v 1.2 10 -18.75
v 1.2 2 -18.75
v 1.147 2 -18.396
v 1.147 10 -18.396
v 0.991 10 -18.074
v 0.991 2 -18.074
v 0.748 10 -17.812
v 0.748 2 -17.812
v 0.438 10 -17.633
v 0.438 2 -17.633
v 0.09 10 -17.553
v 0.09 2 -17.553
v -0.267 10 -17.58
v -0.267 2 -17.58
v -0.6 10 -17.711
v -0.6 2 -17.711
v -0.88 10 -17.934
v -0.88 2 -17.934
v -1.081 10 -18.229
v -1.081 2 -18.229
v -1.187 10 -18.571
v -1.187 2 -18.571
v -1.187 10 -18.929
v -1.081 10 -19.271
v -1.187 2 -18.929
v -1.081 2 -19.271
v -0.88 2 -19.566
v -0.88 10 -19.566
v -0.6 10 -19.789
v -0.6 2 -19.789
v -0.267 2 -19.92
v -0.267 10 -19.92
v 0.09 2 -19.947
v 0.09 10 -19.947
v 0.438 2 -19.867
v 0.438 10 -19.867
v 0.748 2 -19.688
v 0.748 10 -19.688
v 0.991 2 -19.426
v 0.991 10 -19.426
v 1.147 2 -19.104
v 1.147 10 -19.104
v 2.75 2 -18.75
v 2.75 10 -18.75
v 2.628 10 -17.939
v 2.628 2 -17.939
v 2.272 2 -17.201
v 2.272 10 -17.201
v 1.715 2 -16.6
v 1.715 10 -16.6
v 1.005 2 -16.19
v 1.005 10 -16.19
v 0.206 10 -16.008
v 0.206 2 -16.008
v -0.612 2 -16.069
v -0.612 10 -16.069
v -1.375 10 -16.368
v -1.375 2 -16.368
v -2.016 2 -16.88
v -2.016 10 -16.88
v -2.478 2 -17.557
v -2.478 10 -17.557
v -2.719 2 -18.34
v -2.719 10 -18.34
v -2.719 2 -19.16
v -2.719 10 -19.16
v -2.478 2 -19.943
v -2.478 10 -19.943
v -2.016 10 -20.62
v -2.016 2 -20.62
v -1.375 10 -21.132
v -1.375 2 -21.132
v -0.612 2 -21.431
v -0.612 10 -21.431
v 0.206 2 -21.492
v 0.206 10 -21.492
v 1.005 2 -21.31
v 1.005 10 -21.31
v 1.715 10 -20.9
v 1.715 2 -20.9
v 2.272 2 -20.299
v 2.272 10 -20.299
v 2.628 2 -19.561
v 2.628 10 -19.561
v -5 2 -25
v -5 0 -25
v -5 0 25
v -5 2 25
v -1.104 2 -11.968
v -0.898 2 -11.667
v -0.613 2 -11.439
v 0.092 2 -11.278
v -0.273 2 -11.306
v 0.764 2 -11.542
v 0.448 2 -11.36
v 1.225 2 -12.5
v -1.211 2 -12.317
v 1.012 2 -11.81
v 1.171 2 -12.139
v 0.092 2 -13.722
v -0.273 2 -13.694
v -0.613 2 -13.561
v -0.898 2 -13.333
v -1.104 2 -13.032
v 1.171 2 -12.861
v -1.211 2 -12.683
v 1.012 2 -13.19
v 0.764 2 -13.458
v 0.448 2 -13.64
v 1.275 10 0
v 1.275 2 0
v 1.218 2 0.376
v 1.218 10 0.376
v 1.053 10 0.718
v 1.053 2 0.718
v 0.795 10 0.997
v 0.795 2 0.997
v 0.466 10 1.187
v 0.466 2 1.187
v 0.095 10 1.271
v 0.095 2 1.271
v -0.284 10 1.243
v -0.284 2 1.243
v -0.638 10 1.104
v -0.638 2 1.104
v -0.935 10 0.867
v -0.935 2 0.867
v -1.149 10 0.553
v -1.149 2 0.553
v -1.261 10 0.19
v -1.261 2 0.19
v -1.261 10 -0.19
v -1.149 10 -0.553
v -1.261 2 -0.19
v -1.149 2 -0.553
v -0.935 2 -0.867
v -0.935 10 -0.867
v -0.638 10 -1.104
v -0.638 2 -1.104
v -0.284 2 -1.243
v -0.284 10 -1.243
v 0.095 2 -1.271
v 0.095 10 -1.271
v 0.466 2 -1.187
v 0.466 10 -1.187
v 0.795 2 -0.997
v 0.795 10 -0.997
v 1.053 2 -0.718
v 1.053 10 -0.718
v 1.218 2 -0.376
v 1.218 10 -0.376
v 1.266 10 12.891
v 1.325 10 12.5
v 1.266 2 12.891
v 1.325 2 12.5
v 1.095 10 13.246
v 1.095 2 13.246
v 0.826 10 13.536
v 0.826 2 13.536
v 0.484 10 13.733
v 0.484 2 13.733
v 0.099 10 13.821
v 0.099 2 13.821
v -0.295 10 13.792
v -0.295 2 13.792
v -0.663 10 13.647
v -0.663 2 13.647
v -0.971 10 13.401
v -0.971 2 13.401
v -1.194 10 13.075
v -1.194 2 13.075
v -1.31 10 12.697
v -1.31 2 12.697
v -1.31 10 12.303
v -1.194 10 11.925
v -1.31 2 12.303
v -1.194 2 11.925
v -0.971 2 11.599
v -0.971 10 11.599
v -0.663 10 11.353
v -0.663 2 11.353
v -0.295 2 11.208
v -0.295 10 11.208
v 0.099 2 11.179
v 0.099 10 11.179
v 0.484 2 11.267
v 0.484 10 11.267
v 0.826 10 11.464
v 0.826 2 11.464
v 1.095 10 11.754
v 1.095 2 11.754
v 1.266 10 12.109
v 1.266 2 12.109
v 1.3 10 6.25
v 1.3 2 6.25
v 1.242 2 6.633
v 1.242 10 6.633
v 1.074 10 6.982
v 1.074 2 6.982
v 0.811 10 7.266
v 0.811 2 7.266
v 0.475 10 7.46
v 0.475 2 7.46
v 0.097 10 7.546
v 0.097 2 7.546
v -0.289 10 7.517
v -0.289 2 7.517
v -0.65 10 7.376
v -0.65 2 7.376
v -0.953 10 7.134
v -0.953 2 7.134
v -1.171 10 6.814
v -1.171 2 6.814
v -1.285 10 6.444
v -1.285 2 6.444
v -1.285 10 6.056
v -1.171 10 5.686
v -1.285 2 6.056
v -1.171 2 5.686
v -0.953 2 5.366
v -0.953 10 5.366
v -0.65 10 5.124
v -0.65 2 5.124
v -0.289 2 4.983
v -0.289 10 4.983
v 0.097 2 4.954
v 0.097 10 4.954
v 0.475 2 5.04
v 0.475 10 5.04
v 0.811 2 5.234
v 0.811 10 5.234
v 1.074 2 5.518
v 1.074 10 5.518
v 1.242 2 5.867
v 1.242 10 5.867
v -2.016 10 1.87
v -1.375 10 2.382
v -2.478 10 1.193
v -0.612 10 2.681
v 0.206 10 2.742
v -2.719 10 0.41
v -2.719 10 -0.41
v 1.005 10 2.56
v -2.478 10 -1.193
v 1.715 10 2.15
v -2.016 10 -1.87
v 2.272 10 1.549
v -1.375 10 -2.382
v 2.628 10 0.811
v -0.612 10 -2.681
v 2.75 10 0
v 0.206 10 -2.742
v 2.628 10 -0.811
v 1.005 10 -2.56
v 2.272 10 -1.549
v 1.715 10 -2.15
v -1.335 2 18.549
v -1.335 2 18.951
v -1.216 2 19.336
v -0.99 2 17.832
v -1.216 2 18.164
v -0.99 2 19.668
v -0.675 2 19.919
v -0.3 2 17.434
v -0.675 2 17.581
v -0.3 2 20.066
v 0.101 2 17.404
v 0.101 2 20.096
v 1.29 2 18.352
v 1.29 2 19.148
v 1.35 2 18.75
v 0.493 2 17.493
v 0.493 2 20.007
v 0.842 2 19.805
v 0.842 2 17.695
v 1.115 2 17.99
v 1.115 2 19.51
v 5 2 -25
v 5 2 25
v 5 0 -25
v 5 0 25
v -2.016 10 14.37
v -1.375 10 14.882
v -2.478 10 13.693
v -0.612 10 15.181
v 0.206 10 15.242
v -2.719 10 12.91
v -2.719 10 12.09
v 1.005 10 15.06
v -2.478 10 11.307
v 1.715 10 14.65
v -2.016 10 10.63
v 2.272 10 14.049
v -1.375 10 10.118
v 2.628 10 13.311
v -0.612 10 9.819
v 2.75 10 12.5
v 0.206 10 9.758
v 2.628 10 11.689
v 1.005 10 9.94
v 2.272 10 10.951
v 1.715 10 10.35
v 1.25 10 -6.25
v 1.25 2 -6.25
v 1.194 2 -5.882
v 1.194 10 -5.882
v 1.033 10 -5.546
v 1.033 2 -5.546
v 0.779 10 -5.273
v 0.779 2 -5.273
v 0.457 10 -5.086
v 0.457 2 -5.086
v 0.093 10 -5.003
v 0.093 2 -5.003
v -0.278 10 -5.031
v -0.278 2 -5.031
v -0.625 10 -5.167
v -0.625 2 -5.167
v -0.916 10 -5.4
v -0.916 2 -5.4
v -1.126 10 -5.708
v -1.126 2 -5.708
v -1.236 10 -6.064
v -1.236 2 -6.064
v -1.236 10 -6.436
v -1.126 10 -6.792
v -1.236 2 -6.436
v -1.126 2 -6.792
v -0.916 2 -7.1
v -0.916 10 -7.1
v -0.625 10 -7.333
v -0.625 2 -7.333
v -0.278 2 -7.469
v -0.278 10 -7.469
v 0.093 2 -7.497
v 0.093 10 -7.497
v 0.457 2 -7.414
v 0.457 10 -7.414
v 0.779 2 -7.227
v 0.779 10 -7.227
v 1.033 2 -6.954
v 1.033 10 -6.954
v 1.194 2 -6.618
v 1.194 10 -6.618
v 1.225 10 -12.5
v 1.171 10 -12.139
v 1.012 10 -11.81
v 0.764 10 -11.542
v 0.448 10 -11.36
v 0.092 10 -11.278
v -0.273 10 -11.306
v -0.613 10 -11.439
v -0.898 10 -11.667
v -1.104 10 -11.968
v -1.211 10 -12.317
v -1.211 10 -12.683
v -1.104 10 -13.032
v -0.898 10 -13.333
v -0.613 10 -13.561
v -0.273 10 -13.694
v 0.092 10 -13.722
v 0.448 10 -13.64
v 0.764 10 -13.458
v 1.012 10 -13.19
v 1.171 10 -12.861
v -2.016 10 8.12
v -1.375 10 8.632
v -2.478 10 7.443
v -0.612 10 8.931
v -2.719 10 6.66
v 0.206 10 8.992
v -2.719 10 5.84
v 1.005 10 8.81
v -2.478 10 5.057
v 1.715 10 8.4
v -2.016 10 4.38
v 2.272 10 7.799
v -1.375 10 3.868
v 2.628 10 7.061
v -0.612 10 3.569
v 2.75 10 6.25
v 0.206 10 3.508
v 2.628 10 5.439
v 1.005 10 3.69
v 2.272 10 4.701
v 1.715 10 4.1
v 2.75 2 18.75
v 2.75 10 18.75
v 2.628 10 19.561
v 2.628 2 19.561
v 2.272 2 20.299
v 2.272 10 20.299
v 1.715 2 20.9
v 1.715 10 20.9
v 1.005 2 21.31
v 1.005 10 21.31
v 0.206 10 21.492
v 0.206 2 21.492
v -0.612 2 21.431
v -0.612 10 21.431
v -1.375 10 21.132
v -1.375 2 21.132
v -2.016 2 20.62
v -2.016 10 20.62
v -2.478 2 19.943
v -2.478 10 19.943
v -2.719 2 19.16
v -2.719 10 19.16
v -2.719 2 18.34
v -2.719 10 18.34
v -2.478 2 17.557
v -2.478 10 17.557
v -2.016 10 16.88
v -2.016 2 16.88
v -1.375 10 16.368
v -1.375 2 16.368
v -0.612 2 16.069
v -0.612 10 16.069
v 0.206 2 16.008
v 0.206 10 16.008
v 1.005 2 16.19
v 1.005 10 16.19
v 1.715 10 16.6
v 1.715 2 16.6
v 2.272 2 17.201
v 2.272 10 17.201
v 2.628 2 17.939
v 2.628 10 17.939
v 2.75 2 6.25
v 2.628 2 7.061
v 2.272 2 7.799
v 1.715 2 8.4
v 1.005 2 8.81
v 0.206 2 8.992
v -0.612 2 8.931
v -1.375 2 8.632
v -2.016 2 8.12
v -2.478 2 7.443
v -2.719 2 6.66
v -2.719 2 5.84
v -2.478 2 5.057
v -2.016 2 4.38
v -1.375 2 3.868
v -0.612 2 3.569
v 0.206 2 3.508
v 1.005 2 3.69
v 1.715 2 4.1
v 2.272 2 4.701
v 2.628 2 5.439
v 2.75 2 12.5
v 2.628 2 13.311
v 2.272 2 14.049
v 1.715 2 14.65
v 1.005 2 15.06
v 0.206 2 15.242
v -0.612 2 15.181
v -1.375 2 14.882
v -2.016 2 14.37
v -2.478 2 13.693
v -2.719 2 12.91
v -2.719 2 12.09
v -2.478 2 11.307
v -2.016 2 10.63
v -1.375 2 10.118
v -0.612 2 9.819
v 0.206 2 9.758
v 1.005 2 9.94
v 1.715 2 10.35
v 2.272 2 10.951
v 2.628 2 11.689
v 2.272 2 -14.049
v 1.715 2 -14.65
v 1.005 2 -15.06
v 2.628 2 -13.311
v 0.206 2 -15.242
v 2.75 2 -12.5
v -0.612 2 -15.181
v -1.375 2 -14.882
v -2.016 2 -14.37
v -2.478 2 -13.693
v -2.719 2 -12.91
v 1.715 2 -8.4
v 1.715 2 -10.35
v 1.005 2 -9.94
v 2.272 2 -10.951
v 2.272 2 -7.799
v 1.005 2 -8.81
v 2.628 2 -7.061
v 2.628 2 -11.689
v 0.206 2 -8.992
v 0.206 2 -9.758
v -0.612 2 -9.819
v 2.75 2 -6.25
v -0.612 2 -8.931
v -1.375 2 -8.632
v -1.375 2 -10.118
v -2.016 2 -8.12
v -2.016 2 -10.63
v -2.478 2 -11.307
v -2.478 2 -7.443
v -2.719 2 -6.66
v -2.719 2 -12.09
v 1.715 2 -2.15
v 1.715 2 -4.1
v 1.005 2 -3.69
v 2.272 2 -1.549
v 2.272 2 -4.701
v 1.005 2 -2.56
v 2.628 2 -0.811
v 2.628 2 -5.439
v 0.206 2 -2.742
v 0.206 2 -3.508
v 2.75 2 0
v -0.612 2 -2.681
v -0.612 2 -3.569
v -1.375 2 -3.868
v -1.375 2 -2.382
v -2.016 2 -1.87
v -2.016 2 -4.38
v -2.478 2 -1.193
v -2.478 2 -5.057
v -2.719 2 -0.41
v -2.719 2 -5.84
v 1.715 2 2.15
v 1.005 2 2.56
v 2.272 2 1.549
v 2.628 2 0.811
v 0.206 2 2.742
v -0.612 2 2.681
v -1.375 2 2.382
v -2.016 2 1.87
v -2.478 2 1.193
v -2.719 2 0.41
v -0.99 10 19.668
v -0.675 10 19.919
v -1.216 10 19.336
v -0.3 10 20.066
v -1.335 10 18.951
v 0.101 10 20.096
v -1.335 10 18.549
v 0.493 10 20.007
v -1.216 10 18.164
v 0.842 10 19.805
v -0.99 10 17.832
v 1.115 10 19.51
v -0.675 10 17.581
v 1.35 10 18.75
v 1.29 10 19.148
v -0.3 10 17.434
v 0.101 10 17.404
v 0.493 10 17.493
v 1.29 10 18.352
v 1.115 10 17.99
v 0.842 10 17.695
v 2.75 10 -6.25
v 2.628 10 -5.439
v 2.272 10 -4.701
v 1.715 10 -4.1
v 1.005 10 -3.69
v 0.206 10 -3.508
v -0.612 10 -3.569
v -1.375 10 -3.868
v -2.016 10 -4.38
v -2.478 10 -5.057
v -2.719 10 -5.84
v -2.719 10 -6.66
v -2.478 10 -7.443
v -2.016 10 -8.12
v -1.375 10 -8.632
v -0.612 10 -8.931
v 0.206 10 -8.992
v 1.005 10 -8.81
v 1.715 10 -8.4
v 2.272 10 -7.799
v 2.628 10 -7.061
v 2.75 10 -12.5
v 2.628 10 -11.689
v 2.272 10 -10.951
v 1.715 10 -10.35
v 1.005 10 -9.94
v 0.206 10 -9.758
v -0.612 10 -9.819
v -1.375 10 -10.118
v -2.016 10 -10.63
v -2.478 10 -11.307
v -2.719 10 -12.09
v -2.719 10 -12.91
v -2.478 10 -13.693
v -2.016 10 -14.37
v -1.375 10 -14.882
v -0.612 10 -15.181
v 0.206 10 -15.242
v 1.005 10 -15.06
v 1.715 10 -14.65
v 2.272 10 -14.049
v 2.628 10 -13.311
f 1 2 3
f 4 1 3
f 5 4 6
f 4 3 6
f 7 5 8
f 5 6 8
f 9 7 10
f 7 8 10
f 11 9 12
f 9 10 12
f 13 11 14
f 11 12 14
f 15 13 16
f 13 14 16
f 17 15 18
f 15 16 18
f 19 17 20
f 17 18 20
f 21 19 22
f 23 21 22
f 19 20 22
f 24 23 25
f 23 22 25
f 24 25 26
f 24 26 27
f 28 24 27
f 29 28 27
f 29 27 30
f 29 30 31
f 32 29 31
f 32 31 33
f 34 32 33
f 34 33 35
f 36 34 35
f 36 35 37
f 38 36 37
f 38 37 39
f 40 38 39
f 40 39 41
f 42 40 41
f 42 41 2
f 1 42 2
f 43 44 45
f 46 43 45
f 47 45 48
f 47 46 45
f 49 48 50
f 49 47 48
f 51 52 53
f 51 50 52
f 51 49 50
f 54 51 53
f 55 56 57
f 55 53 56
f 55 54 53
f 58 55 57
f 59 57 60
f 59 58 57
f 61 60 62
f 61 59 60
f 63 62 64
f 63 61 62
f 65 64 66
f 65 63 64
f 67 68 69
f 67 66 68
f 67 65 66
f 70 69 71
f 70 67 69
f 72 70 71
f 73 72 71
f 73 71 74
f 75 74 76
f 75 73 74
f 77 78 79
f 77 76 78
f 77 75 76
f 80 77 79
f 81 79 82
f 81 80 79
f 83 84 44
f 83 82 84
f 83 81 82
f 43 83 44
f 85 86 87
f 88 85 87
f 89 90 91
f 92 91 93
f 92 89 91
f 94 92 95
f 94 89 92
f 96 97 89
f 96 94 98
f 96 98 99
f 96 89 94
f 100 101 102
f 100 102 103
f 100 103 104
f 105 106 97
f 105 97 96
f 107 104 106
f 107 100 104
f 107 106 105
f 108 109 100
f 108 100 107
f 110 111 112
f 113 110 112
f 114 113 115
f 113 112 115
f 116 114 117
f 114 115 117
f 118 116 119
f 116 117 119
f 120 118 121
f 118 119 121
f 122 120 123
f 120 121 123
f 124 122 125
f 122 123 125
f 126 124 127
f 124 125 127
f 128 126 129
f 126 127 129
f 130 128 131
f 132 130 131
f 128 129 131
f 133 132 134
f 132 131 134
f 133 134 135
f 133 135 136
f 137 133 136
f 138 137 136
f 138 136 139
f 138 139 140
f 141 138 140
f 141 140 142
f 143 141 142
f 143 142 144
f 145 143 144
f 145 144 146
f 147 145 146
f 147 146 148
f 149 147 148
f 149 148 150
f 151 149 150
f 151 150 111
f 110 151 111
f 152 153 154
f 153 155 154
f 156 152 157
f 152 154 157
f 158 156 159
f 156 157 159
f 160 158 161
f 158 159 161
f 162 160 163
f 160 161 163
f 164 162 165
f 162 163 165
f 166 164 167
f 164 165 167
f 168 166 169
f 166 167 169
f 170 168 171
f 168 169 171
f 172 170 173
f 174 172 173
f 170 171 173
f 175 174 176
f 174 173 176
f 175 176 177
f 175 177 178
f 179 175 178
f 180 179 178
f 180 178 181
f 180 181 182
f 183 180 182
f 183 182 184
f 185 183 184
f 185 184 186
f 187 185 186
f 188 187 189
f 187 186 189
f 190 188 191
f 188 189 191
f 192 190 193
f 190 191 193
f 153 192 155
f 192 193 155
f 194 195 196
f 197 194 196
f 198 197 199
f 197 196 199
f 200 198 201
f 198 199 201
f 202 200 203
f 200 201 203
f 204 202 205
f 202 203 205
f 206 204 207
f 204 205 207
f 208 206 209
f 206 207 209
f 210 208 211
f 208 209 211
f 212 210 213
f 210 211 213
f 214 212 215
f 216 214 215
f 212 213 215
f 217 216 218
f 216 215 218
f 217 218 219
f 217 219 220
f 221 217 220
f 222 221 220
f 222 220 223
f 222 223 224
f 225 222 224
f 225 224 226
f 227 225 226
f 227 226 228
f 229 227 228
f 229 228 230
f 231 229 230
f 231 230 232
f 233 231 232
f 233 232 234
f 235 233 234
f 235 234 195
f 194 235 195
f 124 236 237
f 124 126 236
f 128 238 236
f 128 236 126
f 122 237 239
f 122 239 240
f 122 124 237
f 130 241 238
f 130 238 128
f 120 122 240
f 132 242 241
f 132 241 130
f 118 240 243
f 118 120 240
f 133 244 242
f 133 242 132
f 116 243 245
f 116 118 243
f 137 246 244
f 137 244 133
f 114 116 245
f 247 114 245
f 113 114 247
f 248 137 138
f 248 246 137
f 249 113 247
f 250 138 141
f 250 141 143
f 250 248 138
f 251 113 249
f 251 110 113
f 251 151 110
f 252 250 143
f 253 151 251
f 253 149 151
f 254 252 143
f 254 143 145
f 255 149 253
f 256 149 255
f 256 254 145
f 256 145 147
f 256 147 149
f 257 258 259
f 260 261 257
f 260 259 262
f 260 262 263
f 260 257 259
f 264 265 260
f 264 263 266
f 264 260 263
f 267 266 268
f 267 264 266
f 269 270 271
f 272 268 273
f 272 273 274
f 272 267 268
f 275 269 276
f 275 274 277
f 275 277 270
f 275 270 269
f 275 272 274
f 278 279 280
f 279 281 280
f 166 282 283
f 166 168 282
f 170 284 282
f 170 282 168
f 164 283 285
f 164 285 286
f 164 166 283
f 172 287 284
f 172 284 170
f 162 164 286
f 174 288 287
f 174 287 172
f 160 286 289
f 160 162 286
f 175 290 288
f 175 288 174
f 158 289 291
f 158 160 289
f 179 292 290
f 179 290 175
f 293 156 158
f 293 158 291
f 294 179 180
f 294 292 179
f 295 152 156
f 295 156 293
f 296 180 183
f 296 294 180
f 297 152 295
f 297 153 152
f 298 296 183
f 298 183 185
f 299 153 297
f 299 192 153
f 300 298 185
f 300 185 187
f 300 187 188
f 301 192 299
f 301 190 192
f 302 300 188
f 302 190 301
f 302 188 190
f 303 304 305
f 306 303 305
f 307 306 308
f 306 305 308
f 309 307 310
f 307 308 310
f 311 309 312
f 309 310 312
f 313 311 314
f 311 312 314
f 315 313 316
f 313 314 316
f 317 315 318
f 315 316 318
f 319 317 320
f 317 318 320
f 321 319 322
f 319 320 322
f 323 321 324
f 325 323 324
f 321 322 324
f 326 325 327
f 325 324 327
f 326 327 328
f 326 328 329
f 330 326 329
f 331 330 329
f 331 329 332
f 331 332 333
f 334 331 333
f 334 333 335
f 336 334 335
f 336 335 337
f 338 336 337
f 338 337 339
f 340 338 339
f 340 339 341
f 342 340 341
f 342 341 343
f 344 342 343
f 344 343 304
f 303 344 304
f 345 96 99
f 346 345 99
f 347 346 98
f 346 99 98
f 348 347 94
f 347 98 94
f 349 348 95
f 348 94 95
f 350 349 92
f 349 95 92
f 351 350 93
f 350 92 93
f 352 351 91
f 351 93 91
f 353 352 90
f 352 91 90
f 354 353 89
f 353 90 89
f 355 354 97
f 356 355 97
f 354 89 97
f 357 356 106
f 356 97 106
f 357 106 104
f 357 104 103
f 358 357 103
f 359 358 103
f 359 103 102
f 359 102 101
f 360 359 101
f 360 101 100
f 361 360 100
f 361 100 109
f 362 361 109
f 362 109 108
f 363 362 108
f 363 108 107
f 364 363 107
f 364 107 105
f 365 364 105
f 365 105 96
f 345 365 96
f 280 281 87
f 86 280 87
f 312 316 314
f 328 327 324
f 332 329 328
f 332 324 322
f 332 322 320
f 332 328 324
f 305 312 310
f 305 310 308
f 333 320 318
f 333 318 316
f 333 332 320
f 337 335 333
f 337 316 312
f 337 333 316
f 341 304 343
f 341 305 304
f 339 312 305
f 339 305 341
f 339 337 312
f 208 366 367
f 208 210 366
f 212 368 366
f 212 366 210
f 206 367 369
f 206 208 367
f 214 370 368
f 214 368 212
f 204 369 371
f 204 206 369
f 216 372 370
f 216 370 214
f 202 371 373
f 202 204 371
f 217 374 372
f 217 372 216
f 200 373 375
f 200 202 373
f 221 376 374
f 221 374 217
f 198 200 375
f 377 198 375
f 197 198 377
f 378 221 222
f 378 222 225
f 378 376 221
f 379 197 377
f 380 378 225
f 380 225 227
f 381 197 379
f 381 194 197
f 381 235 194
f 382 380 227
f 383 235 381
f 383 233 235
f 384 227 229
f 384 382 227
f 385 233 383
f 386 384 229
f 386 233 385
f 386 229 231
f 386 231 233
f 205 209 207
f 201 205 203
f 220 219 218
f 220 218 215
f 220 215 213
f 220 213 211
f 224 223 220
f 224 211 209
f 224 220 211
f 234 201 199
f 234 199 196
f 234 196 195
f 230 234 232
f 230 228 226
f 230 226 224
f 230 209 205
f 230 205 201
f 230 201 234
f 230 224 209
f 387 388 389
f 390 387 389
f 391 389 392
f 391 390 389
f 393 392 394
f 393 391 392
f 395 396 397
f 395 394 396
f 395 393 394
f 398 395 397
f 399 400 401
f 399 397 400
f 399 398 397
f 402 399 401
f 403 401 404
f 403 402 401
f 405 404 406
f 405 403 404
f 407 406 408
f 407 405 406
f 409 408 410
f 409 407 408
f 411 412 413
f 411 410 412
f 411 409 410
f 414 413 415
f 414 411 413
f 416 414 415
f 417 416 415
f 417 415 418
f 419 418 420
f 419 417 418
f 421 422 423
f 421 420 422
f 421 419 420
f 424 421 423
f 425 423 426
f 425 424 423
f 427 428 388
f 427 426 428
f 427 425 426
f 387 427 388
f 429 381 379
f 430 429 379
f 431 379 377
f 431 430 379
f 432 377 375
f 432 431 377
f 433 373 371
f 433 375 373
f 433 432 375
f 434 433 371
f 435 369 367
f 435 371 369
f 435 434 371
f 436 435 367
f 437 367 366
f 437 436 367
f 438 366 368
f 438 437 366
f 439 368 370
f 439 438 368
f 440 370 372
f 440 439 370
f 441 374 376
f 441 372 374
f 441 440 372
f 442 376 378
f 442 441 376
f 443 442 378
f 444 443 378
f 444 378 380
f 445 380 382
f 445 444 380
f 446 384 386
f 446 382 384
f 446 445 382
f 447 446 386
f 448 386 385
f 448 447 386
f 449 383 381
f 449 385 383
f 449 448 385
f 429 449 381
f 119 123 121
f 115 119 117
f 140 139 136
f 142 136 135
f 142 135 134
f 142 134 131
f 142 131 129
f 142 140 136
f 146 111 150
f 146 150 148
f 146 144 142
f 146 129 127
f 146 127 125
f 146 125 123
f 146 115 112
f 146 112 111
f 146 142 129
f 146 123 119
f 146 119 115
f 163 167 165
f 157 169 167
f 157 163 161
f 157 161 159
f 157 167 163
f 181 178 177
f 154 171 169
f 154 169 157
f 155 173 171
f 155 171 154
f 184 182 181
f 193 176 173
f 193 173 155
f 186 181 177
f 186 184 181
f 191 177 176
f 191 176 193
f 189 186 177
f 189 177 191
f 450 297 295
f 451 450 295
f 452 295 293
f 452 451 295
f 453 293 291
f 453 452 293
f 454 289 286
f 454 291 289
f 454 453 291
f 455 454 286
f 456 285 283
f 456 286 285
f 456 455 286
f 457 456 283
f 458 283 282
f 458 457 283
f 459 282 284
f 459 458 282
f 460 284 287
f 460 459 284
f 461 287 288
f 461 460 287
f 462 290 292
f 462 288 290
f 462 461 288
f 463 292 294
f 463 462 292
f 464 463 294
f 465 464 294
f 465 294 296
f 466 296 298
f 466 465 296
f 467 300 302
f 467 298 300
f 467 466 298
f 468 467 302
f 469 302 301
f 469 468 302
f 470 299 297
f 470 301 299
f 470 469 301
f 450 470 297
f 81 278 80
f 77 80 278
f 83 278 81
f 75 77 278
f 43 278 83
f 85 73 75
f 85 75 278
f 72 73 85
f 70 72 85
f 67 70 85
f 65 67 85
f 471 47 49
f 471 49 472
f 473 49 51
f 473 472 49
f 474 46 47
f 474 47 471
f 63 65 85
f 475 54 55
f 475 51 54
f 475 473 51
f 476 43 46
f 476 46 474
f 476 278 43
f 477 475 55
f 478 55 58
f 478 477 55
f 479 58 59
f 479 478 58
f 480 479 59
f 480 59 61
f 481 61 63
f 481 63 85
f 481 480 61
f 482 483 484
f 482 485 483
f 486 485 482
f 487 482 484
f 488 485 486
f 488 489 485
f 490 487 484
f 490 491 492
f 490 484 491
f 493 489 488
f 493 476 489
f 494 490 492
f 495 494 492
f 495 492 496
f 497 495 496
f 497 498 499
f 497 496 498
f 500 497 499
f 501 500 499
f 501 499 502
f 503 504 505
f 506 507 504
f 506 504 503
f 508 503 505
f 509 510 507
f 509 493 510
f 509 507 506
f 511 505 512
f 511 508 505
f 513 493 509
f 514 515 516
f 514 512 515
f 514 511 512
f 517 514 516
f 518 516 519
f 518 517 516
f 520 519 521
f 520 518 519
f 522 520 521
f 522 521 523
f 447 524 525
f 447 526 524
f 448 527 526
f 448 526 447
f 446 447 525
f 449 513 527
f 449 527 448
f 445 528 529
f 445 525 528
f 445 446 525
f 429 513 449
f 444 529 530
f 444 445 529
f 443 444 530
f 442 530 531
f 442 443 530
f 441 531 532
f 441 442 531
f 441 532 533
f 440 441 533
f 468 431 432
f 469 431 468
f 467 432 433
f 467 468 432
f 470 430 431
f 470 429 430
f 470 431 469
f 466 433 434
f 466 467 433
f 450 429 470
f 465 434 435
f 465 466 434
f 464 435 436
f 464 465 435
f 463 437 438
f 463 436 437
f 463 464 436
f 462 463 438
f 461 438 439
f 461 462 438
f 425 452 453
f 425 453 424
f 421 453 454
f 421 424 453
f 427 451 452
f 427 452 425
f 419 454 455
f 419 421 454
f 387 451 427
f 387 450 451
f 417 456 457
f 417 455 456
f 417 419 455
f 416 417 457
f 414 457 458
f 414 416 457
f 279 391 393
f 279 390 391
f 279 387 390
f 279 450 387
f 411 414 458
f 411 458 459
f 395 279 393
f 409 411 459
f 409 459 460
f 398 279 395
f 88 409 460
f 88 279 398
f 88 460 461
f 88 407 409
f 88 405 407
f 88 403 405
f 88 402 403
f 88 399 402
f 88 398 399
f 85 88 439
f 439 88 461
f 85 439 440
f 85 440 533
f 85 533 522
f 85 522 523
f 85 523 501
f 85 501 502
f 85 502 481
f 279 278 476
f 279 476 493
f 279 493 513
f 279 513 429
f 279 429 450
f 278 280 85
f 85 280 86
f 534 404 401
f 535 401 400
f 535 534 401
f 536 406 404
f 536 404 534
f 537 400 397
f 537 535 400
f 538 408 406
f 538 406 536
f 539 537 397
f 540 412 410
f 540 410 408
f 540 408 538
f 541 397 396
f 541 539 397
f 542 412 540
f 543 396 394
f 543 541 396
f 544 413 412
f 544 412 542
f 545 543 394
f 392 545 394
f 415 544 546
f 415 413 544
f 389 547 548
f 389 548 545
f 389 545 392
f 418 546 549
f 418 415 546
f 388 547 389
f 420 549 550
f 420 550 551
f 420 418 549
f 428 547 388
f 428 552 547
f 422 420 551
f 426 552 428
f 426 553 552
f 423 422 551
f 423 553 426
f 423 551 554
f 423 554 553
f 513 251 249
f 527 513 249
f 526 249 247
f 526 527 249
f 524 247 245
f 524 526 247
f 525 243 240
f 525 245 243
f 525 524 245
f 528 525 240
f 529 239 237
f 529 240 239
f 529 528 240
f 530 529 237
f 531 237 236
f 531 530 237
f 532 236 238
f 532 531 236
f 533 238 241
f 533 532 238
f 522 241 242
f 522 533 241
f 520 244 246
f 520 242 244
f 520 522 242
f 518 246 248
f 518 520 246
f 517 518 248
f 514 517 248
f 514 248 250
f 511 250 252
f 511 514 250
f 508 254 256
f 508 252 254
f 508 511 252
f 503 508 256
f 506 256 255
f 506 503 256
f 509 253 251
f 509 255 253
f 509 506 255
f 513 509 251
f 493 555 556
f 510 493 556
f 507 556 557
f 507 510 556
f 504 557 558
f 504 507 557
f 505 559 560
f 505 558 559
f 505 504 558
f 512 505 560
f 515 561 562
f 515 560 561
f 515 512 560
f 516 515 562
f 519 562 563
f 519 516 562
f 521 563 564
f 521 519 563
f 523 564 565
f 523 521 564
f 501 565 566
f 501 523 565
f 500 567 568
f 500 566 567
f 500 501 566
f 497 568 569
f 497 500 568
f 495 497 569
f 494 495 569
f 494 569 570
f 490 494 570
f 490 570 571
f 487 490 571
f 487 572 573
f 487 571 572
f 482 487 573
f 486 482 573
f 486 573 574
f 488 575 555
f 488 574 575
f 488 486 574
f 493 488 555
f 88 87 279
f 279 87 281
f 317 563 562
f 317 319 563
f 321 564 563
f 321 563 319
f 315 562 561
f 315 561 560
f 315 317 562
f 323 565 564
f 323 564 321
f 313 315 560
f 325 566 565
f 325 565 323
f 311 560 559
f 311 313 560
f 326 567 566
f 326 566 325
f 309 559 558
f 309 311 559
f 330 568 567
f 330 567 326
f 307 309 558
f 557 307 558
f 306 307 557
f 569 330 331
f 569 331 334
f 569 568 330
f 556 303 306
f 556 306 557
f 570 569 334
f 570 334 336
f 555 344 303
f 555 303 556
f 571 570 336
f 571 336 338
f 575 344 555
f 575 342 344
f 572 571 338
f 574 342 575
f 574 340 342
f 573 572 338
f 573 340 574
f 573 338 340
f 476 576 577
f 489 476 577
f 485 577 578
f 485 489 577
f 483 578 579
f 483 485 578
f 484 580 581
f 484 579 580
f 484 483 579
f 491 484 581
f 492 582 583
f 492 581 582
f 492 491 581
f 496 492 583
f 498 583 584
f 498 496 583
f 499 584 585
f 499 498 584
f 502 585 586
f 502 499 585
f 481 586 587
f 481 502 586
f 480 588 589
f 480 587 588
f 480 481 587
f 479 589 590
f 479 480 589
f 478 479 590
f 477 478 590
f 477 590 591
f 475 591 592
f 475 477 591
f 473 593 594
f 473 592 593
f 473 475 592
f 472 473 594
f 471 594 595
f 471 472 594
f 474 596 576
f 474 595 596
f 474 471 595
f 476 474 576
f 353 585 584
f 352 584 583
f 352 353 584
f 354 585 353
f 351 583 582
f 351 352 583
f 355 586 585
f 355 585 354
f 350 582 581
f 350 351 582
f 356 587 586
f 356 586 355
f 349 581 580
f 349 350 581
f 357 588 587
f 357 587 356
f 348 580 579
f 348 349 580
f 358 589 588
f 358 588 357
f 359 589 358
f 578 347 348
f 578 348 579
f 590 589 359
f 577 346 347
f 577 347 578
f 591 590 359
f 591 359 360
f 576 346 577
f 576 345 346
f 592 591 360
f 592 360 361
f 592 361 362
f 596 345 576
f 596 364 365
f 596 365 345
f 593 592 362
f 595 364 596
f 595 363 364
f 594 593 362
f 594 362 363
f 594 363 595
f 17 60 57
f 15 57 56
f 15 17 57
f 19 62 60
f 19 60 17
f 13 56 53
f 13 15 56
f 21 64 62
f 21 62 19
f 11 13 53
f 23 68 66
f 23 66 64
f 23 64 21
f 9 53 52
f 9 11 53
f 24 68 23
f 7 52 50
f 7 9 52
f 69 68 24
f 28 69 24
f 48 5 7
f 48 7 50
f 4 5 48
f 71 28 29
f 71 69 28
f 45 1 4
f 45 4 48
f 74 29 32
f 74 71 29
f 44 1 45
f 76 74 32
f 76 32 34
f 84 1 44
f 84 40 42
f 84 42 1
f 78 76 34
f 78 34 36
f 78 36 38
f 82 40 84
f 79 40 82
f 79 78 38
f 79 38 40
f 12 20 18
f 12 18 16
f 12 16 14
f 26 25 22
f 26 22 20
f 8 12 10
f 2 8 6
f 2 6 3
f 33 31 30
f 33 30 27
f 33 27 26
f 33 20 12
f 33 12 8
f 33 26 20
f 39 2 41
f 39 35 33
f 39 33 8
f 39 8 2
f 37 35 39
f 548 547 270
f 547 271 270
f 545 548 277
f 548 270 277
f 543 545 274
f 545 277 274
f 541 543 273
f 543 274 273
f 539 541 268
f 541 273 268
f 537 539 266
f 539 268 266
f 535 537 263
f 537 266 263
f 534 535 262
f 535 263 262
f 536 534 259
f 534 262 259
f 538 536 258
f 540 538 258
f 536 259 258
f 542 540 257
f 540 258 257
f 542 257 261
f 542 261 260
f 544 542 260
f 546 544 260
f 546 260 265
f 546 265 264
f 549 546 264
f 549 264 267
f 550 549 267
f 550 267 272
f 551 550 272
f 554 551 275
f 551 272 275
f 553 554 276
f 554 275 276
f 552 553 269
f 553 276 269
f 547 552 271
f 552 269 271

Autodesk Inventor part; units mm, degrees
ref_plane "YZ Plane" through (0, 0, 0) normal (1, 0, 0) x (0, 1, 0)
ref_plane "XZ Plane" through (0, 0, 0) normal (0, 1, 0) x (-1, 0, 0)
ref_plane "XY Plane" through (0, 0, 0) normal (0, 0, 1) x (1, 0, 0)
sketch "Sketch1" plane through (0, 0, 0) normal (0, 1, 0) x (-1, 0, 0)
  line L0 (5, 25) -> (-5, 25)
  line L1 (-5, 25) -> (-5, -25)
  line L2 (-5, -25) -> (5, -25)
  line L3 (5, -25) -> (5, 25)
  line L4 (5, 25) -> (-5, -25) construction
  line L5 (-5, 25) -> (5, -25) construction
  point P0 (0, 0)
  dimension "d0" = 10
  dimension "d1" = 50
extrude "Extrusion1" add sketch "Sketch1" along normal blind 2
sketch "Sketch2" plane through (0, 2, 0) normal (0, 1, 0) x (1, 0, 0)
  circle A0 centre (0, 18.75) radius 1.2
  line L0 (5, 25) -> (-5, 25) projected
  circle A1 centre (0, 12.5) radius 1.225
  circle A2 centre (0, 6.25) radius 1.25
  circle A3 centre (0, 0) radius 1.275
  circle A4 centre (0, -6.25) radius 1.3
  circle A5 centre (0, -12.5) radius 1.325
  circle A6 centre (0, -18.75) radius 1.35
  line L1 (0, 35) -> (0, -35) projected
  line L2 (-5, -25) -> (5, -25) projected
  dimension "d4" = 2.4
  dimension "d5" = 6.25
  dimension "d6" = 2.45
  dimension "d7" = 2.5
  dimension "d8" = 2.55
  dimension "d9" = 2.6
  dimension "d10" = 2.65
  dimension "d11" = 2.7
  dimension "d12" = 6.25
  dimension "d13" = 6.25
  dimension "d14" = 6.25
  dimension "d15" = 6.25
  dimension "d17" = 6.25
  dimension "d18" = 6.25
  dimension "d19" = 6.25
sketch "Sketch3" plane through (0, 2, 0) normal (0, 1, 0) x (1, 0, 0)
  line L0 (-5, -25) -> (5, -25) projected
  line L1 (5, -25) -> (5, 25) projected
  line L2 (5, 25) -> (-5, 25) projected
  line L3 (-5, 25) -> (-5, -25) projected
  circle A0 centre (0, 18.75) radius 1.2 projected
  circle A1 centre (0, 18.75) radius 2.75
  circle A2 centre (0, 12.5) radius 2.75
  circle A3 centre (0, 6.25) radius 2.75
  circle A4 centre (0, 0) radius 2.75
  circle A5 centre (0, -6.25) radius 2.75
  circle A6 centre (0, -12.5) radius 2.75
  circle A7 centre (0, -18.75) radius 2.75
  dimension "d20" = 5.5
  dimension "d23" = 6.25
extrude "Extrusion2" add sketch "Sketch3" along normal blind 8 contours A0 | A1 | A2 | A3 | A4 | A5 | A6 | A7
extrude "Extrusion3" cut sketch "Sketch2" along normal blind 8
equation "\"d5\" = d19"
equation "\"d12\" = d5"
equation "\"d13\" = d5"
equation "\"d14\" = d5"
equation "\"d15\" = d5"
equation "\"d17\" = d5"
equation "\"d18\" = d5"
properties part number "test_gwintow"
